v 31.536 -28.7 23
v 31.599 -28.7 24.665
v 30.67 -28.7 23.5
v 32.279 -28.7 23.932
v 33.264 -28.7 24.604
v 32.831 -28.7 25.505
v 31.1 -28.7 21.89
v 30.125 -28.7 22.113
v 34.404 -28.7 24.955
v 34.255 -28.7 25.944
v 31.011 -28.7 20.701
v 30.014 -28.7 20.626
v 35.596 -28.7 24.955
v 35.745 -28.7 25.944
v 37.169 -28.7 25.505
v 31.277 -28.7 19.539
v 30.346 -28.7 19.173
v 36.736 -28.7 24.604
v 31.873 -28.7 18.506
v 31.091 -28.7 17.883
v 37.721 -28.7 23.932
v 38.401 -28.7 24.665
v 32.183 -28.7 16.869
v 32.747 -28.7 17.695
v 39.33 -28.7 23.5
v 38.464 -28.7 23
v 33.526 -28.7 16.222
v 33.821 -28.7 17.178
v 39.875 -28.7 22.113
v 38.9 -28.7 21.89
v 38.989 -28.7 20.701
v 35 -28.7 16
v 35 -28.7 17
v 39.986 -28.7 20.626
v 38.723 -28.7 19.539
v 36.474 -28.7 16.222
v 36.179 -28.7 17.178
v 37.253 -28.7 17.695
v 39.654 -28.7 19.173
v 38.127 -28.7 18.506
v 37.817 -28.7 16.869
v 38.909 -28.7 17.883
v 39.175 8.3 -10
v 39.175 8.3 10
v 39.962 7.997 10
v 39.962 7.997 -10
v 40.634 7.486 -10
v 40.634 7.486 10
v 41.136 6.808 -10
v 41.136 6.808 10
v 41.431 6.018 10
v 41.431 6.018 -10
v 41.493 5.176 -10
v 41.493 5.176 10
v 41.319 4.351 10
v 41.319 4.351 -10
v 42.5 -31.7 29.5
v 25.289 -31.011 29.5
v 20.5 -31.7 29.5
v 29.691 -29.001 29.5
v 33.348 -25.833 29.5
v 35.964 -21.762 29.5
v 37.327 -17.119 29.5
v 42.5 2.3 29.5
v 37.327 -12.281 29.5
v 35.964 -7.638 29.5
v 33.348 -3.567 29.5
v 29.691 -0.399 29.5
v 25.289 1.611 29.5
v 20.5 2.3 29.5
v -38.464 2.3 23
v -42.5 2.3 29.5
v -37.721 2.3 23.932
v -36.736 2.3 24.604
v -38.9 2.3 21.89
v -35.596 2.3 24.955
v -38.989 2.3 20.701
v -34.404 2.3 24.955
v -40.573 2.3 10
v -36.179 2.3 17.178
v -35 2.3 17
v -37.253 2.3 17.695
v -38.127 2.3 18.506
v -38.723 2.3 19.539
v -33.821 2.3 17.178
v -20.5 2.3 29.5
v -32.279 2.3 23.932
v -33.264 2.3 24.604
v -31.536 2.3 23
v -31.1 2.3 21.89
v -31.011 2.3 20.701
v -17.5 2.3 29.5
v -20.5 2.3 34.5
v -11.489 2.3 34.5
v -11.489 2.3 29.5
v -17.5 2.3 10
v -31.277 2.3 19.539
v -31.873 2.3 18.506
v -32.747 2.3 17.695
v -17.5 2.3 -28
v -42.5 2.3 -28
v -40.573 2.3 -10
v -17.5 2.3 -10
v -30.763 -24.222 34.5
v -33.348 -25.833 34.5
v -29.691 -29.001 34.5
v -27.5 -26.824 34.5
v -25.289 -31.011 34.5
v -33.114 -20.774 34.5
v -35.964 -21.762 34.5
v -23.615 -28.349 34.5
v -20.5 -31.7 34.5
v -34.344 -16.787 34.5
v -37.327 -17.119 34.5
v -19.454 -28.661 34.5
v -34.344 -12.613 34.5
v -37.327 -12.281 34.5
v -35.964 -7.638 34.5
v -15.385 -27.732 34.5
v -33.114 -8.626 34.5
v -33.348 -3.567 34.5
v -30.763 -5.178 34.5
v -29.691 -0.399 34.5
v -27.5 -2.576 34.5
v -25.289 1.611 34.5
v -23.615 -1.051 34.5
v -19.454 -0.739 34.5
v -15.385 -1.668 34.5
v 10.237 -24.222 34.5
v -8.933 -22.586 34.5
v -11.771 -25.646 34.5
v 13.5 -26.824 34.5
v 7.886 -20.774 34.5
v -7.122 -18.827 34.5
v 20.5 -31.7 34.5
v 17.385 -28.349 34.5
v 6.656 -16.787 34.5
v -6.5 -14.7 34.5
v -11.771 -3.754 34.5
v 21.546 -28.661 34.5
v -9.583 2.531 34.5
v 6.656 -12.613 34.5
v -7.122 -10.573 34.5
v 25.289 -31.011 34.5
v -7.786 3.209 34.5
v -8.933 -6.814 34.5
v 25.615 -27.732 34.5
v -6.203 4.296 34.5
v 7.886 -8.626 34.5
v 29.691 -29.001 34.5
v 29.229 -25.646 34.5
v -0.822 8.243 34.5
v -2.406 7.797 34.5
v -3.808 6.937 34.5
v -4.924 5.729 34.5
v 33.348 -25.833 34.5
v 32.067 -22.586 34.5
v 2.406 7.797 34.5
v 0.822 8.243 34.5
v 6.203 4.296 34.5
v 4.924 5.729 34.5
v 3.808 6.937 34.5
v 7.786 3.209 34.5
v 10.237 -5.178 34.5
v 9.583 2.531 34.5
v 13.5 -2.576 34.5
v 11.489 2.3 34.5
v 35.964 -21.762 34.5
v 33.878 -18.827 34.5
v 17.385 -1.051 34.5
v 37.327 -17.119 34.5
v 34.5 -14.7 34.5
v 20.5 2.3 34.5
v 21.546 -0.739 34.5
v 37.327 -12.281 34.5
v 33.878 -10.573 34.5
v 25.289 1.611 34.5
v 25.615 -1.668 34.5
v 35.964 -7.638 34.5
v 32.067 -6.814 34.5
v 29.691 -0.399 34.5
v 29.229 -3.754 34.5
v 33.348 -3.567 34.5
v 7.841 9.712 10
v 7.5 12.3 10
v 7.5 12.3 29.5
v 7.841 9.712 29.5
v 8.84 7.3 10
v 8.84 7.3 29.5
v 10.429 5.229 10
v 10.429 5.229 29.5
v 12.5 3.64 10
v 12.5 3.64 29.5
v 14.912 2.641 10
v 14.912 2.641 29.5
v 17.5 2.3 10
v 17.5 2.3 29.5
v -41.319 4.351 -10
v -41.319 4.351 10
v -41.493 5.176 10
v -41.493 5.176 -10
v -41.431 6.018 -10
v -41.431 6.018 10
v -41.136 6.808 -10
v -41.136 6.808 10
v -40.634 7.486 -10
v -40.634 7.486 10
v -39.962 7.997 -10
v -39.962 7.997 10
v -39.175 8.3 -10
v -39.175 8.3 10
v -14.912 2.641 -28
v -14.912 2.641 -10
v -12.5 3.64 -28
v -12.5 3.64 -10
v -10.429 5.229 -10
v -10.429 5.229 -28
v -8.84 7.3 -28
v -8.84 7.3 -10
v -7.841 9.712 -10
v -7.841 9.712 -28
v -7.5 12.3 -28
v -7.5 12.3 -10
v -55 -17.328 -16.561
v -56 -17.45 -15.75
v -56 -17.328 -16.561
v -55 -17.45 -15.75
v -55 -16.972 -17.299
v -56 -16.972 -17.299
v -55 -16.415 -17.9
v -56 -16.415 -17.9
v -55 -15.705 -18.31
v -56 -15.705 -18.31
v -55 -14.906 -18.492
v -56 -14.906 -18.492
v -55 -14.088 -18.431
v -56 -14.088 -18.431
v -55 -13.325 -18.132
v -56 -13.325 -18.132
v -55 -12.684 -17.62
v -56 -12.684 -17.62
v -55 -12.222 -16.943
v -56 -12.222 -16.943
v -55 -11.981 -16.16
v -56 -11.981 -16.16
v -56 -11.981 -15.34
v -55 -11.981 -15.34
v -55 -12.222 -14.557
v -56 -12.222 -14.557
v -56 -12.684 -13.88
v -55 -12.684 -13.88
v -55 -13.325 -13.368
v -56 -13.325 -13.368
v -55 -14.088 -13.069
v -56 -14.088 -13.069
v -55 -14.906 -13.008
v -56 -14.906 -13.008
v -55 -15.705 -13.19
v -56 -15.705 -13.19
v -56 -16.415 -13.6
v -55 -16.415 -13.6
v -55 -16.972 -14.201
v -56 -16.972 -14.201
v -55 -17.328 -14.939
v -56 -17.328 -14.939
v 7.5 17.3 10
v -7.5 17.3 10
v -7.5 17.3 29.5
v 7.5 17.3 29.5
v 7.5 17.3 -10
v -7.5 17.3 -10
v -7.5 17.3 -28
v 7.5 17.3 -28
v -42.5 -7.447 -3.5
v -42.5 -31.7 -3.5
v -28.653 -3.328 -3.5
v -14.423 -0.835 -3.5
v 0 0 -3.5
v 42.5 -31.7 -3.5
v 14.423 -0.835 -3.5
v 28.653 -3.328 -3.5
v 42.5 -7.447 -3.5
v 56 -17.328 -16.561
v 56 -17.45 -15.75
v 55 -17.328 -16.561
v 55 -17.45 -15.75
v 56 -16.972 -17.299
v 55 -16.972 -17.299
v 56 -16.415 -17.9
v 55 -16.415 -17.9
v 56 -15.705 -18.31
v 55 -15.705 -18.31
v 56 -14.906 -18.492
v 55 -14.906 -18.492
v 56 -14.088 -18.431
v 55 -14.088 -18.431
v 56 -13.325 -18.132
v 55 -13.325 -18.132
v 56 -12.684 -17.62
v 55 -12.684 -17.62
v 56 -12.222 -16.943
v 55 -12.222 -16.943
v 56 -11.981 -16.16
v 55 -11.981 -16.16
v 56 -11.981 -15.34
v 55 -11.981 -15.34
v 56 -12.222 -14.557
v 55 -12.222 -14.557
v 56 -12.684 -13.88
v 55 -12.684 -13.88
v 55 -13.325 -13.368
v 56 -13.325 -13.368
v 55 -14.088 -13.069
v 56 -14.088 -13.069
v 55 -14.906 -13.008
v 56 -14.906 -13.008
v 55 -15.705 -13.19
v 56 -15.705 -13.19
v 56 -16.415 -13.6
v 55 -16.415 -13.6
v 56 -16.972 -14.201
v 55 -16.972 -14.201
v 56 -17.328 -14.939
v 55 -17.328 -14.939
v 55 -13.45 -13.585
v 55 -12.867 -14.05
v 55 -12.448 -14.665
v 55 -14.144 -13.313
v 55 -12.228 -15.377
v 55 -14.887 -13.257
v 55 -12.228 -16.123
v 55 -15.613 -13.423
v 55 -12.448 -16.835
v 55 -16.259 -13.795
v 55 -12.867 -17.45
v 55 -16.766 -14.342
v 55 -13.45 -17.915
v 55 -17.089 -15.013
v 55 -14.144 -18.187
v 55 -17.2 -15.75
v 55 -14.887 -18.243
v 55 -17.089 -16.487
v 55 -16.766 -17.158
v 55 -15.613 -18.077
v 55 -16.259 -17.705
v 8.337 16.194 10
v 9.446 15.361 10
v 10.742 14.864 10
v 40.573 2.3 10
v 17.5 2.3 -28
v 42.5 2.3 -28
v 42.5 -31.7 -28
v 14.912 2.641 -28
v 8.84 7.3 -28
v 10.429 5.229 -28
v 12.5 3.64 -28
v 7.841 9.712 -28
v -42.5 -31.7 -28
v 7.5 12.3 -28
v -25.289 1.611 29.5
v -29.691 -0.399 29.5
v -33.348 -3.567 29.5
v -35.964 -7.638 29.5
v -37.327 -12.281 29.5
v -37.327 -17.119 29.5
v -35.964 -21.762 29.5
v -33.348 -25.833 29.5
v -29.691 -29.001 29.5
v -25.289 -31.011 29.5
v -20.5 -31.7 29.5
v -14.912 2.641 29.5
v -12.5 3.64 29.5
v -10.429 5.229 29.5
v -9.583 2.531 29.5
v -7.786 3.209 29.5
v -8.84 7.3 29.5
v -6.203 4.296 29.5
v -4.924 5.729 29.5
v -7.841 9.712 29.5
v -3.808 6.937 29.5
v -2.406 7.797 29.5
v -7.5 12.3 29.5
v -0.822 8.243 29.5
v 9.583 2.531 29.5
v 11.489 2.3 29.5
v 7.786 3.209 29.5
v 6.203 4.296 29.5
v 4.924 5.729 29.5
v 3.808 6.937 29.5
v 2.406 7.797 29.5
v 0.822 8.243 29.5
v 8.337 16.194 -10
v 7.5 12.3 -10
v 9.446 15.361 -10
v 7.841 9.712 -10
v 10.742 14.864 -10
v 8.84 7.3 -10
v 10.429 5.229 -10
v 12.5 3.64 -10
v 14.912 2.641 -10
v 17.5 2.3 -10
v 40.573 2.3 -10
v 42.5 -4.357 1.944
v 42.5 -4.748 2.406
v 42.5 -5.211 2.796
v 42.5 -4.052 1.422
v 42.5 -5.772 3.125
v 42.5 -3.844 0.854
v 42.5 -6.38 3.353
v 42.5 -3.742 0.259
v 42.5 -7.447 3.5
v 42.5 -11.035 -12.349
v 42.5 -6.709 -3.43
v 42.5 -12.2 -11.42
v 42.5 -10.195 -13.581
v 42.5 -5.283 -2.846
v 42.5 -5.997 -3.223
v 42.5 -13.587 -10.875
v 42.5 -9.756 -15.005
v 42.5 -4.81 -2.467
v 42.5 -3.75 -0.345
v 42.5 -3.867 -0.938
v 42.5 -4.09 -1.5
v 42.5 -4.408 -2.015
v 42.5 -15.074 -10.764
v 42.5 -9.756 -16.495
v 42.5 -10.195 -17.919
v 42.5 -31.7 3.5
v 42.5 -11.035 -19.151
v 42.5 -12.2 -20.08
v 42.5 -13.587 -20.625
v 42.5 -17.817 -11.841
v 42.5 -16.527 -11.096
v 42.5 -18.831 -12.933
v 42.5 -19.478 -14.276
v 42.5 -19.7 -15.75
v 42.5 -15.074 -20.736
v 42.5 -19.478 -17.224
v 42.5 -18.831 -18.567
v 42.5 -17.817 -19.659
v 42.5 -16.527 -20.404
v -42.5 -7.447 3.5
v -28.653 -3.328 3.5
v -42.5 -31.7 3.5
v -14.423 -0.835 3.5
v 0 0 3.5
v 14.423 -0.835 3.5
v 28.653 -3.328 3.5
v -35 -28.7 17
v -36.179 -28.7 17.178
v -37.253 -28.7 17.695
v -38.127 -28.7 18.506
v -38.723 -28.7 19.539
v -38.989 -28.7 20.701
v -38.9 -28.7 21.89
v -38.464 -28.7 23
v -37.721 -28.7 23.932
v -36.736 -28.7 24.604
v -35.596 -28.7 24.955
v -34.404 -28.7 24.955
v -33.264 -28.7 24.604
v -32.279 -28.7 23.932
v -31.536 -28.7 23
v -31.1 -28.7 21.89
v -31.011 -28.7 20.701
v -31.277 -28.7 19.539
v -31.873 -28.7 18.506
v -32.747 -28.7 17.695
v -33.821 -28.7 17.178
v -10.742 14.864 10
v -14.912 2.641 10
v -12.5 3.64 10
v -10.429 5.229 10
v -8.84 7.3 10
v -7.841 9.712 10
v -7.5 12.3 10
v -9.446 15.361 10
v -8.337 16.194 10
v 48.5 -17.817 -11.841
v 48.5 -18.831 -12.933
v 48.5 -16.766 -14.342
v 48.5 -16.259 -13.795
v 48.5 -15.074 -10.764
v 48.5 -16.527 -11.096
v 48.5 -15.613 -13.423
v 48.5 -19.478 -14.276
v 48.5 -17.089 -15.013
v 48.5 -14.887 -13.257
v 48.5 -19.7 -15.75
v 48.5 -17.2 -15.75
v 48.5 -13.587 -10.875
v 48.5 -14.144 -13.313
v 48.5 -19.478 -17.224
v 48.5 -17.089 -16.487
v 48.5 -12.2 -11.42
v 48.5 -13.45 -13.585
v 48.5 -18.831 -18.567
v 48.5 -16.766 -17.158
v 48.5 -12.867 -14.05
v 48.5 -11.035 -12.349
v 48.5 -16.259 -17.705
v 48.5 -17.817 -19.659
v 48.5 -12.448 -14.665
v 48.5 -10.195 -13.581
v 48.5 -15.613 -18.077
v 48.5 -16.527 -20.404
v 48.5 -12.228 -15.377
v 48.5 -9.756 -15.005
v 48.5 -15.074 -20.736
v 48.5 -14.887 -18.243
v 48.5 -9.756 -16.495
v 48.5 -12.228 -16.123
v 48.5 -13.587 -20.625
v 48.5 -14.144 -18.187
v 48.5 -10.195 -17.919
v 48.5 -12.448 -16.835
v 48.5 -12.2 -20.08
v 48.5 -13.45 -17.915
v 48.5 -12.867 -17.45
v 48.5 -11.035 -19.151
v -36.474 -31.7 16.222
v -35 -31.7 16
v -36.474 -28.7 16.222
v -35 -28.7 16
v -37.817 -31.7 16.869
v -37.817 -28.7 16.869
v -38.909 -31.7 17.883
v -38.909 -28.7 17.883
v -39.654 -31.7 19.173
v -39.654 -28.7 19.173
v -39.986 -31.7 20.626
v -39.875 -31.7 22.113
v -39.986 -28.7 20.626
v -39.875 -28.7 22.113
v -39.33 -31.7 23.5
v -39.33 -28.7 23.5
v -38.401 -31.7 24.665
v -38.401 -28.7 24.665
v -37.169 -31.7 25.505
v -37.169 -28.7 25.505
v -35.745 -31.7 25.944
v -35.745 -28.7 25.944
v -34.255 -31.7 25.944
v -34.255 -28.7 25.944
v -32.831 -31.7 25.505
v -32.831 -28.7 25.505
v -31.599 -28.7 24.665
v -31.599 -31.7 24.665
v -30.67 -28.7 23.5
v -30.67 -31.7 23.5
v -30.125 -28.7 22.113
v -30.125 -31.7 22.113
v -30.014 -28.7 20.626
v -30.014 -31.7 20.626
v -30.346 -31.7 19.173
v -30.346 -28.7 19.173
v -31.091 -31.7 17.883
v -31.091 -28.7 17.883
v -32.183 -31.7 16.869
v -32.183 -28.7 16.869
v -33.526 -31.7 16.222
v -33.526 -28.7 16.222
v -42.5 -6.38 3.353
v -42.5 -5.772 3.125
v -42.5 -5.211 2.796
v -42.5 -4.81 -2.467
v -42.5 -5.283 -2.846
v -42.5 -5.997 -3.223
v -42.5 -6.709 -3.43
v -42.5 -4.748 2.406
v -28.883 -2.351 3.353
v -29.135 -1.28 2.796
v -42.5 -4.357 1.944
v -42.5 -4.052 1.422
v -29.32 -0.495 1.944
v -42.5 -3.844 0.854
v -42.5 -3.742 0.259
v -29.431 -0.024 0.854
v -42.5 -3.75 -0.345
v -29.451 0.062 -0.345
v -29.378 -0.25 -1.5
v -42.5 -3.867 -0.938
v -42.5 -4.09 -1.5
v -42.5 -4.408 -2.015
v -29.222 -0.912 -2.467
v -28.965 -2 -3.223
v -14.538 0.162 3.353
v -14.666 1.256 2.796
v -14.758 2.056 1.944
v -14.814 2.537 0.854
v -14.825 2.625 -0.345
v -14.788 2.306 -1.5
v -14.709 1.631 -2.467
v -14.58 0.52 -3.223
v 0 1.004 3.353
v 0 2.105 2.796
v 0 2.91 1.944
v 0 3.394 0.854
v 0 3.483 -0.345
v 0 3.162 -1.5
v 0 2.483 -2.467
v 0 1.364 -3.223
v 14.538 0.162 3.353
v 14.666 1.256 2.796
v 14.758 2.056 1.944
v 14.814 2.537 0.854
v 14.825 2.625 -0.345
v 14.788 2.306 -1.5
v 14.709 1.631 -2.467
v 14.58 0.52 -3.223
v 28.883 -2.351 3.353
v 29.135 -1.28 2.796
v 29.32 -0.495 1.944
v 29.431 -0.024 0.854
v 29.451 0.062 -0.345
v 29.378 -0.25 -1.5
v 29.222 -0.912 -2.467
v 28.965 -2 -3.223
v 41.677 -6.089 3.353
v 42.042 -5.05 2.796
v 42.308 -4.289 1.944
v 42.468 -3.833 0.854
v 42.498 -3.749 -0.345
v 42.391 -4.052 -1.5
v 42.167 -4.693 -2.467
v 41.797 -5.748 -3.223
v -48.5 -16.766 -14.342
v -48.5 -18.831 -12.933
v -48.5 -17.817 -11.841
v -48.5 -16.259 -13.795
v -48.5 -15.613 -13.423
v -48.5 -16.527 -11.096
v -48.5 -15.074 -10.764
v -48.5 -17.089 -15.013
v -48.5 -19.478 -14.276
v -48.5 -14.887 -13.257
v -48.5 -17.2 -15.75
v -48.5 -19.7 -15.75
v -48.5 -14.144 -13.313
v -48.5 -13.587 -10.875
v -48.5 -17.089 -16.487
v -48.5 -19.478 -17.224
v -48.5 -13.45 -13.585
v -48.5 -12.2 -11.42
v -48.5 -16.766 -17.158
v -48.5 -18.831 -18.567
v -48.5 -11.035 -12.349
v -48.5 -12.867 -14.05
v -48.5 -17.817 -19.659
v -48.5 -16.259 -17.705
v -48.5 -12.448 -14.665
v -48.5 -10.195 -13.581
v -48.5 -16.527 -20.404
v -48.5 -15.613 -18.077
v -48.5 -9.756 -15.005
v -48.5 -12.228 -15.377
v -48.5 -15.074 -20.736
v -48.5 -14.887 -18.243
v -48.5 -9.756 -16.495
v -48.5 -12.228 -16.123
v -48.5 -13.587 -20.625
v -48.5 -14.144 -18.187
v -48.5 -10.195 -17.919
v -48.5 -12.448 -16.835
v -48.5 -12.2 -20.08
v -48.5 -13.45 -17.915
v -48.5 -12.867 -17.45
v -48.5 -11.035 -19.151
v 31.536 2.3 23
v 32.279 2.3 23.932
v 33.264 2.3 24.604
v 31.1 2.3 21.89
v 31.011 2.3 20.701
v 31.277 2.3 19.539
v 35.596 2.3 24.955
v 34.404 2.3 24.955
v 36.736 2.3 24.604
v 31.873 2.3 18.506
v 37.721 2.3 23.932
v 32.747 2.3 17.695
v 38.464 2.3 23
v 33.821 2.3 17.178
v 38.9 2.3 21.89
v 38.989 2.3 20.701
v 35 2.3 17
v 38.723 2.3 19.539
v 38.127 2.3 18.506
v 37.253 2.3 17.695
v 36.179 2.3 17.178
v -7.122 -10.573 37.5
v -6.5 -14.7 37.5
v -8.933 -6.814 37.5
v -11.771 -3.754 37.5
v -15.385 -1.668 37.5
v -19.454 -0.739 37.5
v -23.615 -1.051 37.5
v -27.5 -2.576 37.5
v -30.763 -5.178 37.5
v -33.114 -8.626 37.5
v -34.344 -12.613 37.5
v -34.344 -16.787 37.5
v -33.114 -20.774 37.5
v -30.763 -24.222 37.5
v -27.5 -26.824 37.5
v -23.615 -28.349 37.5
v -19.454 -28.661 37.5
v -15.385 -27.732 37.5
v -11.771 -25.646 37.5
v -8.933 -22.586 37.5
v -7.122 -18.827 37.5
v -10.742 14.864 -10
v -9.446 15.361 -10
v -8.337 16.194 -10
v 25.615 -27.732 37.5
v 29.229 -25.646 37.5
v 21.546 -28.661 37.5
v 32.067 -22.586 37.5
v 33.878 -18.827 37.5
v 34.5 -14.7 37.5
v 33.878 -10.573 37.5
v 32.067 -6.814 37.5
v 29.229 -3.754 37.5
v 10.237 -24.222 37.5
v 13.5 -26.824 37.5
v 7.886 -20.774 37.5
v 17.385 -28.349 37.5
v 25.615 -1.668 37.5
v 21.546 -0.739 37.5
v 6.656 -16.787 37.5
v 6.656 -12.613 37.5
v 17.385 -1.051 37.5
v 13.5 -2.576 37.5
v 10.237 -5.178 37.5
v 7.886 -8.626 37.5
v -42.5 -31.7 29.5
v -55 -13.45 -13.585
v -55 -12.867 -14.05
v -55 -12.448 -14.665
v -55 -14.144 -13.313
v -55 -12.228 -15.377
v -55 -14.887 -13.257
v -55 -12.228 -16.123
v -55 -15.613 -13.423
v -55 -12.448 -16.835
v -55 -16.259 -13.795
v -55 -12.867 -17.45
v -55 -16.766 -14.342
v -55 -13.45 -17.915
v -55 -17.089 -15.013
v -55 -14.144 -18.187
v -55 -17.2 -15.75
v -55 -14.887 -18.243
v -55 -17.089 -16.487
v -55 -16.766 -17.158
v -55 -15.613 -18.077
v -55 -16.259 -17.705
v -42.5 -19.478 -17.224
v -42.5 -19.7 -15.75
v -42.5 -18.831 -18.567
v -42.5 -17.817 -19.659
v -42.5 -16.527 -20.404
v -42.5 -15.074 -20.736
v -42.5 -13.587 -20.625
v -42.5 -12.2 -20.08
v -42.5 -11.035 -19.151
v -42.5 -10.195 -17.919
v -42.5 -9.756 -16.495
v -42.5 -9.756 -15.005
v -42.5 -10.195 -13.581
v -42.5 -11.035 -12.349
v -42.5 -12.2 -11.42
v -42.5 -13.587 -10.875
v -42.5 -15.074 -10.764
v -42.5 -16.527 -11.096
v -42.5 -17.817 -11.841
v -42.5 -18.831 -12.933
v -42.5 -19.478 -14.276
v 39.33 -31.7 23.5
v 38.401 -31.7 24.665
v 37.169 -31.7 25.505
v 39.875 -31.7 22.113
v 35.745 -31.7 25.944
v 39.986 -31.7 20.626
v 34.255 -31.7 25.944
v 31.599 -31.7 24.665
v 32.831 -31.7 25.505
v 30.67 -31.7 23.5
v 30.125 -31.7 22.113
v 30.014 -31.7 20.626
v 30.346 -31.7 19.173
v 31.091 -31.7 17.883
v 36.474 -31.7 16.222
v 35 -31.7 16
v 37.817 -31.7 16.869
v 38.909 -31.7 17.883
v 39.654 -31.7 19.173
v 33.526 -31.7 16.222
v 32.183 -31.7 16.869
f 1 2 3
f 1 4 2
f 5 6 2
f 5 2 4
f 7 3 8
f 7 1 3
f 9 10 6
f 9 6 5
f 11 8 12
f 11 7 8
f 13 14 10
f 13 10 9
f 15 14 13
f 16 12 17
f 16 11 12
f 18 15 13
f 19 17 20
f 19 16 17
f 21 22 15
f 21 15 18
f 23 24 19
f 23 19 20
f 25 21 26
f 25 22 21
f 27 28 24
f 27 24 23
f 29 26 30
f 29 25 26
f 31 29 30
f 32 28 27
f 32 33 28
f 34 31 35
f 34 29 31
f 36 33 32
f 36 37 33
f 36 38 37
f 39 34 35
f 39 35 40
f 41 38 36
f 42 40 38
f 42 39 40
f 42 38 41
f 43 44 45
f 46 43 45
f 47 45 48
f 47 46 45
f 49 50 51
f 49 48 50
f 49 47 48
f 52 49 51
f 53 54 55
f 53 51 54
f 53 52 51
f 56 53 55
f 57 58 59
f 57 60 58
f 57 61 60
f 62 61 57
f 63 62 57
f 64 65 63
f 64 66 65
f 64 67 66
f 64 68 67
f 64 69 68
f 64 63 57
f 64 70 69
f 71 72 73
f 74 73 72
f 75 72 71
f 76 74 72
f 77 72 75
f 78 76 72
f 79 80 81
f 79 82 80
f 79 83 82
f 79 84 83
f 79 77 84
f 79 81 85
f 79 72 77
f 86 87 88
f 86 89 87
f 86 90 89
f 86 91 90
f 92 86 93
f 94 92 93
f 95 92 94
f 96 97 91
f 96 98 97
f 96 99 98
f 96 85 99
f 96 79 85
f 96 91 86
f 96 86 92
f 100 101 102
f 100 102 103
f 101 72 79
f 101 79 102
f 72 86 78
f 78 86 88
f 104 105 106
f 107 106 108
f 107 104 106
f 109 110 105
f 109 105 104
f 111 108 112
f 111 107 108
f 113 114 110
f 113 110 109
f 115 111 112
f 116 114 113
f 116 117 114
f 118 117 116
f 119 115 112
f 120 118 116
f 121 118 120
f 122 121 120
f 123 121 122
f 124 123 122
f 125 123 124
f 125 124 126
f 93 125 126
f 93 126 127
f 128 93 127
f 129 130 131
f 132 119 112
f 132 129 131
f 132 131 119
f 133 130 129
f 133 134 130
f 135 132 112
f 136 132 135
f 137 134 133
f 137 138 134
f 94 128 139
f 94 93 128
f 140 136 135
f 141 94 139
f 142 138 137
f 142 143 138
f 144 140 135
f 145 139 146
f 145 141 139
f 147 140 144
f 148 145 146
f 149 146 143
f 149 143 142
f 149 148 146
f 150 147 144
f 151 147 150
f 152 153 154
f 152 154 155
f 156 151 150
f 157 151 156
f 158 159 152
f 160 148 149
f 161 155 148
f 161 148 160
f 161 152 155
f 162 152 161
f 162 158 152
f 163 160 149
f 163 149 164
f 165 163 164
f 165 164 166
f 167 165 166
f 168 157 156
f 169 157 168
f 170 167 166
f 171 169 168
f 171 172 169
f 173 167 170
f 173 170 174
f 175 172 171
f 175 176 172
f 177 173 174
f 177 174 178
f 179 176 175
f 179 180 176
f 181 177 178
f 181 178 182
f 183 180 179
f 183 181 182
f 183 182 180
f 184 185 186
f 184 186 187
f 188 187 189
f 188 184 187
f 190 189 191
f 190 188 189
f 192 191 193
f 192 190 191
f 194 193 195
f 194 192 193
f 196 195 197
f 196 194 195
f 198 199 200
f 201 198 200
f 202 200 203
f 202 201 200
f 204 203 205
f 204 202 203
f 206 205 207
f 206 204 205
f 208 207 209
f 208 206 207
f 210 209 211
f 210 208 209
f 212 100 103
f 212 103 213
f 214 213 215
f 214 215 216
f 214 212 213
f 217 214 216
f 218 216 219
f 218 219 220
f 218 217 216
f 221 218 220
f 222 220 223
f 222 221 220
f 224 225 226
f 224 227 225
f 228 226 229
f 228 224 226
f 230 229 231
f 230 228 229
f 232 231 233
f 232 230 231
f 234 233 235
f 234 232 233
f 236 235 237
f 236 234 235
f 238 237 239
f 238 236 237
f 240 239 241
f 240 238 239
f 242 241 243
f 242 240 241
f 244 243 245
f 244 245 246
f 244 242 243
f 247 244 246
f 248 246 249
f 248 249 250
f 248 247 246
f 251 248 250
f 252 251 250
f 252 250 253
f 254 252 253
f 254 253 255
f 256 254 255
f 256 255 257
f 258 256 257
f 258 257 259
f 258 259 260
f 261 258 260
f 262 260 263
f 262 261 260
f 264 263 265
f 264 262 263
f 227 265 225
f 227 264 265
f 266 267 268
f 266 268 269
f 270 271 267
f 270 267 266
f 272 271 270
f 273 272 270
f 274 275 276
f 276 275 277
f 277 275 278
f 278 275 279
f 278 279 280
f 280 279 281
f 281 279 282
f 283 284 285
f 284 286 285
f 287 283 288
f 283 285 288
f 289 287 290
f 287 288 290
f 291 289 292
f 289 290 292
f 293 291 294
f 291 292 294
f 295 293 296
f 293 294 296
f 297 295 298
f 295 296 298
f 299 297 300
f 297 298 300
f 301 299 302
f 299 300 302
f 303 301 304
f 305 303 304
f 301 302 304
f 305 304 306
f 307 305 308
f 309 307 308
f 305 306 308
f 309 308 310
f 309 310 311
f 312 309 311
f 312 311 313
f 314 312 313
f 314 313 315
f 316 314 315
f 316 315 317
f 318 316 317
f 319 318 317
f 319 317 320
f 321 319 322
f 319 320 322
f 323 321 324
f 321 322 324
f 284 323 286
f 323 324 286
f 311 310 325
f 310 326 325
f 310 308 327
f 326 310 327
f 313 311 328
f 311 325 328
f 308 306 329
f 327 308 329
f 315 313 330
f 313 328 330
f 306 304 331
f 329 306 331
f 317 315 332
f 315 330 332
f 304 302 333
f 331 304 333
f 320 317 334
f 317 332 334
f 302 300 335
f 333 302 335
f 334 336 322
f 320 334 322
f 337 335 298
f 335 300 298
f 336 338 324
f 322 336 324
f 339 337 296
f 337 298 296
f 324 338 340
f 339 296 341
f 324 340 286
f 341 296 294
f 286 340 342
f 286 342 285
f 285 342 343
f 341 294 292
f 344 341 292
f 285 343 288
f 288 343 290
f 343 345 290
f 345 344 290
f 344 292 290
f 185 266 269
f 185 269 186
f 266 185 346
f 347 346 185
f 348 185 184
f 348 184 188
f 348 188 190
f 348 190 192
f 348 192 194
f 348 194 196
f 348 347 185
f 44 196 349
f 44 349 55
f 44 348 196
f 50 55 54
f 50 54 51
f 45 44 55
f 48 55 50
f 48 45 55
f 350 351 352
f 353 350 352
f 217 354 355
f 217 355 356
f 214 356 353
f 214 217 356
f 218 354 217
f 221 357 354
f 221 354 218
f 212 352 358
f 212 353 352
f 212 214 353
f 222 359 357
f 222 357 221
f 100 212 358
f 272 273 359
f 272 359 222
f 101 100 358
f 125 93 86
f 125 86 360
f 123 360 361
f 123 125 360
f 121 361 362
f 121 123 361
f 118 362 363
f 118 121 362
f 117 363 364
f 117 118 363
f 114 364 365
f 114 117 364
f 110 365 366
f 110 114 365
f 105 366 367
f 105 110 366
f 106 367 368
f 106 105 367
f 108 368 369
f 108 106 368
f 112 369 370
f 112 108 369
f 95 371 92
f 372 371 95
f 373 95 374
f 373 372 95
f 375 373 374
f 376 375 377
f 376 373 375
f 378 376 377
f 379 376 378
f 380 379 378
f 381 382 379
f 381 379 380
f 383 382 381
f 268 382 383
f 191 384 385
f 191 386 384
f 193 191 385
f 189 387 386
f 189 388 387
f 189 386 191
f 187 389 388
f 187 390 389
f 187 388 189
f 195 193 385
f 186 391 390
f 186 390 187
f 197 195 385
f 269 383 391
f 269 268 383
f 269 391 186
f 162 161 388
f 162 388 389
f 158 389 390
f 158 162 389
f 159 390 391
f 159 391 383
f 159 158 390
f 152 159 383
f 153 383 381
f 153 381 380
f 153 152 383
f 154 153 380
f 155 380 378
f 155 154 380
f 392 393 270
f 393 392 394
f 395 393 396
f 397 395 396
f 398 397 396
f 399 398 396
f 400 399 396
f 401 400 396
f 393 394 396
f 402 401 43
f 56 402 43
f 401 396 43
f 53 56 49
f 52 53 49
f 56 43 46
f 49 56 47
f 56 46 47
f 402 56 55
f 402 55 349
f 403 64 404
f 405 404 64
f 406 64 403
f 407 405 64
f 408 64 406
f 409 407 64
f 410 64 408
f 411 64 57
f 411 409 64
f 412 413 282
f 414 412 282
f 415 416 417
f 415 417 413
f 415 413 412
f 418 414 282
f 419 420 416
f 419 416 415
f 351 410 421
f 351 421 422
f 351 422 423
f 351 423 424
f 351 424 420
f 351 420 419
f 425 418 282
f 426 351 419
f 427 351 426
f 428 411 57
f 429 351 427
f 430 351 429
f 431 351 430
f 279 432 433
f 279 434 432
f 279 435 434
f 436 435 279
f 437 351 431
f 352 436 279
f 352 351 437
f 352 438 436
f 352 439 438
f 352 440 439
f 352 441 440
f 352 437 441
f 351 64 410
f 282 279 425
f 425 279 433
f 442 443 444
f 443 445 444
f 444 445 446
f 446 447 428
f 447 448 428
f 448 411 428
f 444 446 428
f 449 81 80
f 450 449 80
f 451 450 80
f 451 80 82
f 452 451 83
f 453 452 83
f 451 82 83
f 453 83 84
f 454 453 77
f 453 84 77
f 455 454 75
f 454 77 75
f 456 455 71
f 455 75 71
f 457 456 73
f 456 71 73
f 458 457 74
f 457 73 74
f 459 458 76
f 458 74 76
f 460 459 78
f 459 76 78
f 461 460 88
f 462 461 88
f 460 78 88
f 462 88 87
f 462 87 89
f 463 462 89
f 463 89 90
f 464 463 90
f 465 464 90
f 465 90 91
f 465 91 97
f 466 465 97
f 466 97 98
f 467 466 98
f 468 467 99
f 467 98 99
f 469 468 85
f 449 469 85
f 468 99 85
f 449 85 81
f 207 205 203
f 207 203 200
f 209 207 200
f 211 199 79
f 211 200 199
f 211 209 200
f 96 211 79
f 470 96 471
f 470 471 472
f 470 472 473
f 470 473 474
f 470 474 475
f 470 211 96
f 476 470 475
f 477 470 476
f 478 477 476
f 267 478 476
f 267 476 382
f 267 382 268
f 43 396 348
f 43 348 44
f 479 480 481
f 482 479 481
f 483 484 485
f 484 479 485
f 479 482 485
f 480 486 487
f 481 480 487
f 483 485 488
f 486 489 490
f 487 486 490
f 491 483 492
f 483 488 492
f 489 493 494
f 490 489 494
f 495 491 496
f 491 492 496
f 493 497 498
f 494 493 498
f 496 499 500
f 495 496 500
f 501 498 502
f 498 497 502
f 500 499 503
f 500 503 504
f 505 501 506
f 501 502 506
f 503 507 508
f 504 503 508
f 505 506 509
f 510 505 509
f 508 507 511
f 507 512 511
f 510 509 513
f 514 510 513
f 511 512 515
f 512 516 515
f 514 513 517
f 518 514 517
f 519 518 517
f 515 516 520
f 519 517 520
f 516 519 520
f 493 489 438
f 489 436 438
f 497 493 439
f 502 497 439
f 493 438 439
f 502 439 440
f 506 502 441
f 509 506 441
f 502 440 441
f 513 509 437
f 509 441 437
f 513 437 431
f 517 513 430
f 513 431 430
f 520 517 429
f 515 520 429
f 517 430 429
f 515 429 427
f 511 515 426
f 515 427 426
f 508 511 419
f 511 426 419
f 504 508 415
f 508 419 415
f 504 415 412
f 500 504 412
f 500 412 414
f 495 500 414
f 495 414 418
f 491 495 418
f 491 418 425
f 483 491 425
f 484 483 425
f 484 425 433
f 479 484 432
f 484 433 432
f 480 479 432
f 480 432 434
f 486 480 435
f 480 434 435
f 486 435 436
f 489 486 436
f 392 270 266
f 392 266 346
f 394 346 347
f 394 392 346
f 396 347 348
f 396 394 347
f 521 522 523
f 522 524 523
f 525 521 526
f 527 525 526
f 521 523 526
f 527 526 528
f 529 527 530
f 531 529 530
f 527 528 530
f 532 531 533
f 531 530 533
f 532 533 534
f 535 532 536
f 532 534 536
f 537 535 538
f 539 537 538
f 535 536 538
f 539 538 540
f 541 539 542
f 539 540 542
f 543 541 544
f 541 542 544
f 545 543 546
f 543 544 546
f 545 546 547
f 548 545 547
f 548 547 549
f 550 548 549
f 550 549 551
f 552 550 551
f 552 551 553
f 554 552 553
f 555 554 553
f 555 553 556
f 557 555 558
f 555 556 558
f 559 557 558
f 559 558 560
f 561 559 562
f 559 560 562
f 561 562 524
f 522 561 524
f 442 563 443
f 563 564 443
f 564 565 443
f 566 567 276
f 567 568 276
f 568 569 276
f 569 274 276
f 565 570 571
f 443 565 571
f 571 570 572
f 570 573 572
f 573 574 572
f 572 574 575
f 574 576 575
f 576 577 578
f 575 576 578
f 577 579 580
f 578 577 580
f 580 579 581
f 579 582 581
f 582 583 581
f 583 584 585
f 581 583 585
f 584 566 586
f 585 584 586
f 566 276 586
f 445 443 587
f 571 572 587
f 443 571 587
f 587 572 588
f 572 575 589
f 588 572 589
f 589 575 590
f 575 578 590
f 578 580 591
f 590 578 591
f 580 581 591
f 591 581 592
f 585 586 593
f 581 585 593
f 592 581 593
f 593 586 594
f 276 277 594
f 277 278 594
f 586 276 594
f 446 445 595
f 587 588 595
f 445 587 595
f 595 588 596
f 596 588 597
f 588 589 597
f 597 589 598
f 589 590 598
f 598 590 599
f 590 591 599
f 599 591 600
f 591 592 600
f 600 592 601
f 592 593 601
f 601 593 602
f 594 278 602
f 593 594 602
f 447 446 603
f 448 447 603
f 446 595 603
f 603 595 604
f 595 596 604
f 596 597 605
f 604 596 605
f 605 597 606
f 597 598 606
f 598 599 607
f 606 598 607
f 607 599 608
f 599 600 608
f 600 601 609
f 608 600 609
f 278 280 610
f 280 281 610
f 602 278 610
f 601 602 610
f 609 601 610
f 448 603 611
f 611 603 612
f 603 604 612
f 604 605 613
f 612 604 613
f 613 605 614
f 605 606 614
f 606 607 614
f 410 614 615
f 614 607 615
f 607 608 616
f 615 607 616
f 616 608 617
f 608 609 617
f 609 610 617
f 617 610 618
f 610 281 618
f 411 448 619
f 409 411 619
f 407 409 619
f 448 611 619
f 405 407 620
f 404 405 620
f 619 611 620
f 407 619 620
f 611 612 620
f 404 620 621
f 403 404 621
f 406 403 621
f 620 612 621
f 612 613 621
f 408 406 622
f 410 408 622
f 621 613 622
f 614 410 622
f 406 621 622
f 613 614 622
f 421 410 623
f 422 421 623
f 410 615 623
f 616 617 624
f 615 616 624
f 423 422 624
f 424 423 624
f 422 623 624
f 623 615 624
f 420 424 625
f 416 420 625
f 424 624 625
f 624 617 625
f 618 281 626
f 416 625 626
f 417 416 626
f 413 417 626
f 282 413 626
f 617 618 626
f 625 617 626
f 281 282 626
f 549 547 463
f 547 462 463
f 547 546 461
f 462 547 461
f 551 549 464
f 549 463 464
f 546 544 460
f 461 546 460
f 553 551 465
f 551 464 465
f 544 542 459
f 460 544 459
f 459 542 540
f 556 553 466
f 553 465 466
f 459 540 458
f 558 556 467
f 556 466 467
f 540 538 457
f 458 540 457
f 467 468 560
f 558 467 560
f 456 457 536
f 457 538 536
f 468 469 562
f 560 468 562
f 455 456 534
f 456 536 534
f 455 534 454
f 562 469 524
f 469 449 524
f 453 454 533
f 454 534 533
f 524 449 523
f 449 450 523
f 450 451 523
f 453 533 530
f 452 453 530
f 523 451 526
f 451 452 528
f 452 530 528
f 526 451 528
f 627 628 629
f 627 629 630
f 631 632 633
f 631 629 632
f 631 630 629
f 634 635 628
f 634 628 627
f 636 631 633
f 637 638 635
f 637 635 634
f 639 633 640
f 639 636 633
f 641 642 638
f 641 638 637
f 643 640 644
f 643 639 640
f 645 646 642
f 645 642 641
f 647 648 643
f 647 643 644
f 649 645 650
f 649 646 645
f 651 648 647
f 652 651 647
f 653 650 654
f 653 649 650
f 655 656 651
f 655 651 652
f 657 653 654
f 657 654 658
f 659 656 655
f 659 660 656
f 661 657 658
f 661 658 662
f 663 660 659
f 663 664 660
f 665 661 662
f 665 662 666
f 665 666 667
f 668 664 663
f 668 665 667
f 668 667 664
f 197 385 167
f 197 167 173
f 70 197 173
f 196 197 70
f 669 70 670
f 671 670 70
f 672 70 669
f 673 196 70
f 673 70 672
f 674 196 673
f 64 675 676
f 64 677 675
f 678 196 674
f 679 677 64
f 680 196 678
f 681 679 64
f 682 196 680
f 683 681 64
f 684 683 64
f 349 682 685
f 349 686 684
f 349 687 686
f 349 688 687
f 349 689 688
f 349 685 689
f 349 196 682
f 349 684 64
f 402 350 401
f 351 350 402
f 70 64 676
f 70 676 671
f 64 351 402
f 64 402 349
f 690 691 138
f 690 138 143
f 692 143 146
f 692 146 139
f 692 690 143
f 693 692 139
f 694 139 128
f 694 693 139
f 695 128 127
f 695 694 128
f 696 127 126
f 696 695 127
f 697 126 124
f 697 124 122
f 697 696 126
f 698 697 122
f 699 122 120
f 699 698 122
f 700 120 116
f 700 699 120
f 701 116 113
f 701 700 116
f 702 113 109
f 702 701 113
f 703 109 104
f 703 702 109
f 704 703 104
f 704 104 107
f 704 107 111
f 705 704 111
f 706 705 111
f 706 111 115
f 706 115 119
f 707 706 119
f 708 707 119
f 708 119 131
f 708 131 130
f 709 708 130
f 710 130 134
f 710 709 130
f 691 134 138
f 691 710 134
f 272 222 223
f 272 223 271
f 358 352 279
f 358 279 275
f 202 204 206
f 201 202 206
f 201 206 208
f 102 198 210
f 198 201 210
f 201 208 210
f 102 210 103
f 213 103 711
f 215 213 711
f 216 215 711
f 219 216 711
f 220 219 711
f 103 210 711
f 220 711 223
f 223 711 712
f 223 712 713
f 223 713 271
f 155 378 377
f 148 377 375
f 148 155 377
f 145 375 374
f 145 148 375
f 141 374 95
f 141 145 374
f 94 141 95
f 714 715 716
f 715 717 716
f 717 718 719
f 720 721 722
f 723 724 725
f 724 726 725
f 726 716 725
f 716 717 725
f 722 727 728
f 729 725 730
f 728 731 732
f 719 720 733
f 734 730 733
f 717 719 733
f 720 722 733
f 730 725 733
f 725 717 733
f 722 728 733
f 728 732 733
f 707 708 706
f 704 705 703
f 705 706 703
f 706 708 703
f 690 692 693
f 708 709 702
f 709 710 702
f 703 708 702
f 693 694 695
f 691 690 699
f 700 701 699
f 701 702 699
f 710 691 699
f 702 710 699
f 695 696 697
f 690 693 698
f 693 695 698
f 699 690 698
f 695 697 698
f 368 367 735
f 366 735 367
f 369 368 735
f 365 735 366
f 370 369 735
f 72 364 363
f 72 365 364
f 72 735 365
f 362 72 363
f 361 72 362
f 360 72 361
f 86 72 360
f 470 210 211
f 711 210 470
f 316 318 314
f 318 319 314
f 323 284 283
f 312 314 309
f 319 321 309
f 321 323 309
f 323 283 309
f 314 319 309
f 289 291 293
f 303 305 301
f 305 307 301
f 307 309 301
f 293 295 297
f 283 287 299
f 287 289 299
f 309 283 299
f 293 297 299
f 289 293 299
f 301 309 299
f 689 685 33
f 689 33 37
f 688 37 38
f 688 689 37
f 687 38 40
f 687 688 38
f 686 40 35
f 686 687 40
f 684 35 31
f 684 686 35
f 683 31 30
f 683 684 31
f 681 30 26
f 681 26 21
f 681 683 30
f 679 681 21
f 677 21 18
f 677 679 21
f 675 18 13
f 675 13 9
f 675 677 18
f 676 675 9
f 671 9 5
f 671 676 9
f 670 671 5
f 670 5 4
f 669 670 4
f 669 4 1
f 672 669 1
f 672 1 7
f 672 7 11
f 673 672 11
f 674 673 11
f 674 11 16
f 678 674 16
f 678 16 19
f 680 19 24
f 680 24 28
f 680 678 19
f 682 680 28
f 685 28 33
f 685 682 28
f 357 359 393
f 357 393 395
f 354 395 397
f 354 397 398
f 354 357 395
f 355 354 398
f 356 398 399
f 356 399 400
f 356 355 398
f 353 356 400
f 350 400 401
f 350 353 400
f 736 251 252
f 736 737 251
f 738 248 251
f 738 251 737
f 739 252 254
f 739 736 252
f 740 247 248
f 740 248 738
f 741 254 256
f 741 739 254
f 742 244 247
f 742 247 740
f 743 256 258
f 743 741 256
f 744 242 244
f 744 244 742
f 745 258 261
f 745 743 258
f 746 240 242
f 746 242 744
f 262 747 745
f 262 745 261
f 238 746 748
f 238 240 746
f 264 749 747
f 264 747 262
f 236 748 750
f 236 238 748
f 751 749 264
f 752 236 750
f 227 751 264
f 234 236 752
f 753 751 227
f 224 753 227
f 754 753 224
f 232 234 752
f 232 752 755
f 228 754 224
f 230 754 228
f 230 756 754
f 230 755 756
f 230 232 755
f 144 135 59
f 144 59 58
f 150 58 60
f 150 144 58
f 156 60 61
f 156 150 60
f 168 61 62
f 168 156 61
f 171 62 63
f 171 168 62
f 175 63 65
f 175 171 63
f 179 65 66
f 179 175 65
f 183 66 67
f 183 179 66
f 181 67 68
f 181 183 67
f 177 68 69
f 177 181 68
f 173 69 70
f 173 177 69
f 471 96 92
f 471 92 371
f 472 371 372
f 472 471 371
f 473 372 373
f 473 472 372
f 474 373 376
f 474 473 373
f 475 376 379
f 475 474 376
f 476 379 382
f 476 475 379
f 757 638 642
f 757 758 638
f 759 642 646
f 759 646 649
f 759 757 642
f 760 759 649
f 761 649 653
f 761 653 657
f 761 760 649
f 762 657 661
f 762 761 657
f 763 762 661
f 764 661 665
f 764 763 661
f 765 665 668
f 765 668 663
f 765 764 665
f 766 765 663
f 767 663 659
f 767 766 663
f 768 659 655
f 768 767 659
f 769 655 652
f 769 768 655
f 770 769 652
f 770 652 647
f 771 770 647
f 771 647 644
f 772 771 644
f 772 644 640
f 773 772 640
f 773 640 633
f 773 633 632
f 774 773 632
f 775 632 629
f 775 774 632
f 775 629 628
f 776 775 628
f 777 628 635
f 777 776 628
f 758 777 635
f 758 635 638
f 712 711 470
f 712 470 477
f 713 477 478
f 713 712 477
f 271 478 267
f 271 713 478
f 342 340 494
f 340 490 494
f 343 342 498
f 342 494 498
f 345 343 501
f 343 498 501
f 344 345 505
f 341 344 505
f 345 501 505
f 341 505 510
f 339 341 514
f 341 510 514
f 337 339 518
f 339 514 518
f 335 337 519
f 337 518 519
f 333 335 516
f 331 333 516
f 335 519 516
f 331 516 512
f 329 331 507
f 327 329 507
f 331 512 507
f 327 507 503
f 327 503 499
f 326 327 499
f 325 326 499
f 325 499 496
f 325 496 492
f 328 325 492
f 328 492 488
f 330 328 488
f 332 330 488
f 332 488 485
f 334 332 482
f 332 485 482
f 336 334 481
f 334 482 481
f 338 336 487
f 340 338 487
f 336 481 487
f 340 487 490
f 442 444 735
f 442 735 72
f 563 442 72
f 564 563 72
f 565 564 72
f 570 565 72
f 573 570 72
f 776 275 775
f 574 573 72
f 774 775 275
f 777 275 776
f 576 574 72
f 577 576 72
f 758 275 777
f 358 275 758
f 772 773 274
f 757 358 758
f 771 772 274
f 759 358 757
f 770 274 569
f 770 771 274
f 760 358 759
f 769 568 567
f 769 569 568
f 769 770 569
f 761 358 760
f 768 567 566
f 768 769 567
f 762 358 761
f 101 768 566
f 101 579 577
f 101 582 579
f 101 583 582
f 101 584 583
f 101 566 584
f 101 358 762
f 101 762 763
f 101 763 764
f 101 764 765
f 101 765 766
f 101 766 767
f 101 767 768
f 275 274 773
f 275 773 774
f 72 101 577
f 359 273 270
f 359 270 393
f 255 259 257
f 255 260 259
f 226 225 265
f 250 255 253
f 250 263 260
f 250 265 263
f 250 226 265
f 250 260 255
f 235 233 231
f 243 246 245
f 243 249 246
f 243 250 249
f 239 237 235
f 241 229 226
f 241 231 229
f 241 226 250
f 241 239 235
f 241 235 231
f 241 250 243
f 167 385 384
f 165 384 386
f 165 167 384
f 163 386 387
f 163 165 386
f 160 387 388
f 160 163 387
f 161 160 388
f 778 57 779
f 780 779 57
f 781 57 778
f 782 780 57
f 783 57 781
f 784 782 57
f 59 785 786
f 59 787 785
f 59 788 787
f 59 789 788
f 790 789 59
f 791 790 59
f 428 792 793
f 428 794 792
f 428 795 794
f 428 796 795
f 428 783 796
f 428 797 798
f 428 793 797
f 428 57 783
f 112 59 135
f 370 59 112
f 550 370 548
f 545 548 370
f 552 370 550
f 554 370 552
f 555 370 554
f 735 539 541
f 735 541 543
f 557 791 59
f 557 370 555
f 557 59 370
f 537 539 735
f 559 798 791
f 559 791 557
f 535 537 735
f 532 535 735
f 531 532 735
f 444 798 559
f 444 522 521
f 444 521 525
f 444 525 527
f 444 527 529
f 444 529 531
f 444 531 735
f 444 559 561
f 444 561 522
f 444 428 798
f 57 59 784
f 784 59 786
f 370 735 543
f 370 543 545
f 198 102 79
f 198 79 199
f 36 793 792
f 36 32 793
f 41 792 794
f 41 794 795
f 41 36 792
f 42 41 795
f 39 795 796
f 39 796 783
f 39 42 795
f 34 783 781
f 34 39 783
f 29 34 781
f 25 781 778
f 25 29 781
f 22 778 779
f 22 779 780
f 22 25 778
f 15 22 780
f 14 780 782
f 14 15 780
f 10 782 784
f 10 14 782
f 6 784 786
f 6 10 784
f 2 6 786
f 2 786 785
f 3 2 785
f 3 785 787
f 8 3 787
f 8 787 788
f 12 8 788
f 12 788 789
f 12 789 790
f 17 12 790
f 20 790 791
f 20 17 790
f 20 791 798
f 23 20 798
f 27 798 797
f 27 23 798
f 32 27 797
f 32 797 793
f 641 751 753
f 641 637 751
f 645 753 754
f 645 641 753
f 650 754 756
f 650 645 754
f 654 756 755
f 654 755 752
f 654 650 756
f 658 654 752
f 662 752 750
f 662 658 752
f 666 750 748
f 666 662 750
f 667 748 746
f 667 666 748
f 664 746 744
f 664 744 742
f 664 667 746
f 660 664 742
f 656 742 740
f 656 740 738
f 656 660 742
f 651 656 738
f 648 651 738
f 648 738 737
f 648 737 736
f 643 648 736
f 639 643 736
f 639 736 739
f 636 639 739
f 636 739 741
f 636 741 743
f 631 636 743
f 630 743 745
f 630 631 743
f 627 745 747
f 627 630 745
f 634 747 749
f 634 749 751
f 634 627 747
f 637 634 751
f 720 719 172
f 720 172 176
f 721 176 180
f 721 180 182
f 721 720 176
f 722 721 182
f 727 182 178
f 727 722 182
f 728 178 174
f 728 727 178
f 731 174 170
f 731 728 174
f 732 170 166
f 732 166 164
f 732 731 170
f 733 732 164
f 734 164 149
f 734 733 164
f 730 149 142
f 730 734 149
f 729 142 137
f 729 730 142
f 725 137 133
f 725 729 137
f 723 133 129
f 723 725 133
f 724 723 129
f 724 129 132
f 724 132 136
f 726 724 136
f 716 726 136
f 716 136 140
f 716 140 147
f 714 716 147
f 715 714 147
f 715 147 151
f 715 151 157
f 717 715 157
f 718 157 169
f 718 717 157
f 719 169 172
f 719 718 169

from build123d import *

# Parameters (mm, degrees)
BOSS_EXTRUDE1_DEPTH      = 37.5
BOSS_EXTRUDE1_DEPTH_BACK = 28
CUT_EXTRUDE2_START       = -28
CUT_EXTRUDE2_DEPTH       = 18
CUT_EXTRUDE3_START       = 10
CUT_EXTRUDE3_DEPTH       = 27.5
SKETCH6_OUTSIDE_W        = 110.594
SKETCH6_OUTSIDE_H        = 74.594
CUT_EXTRUDE4_DEPTH       = 8
SKETCH7_OUTSIDE_W        = 110.594
SKETCH7_OUTSIDE_H        = 74.594
SKETCH7_OUTSIDE_R        = 14
CUT_EXTRUDE5_DEPTH       = 3


# Read off the part's stored shape, not the designer's step: Cut-Extrude2, Cut-Extrude3
with BuildPart() as part:
    # Sketch1 → Boss-Extrude1 (new, two sides: drawn at the far end of the back side and taken through both)
    with BuildSketch(Plane.XY.offset(-BOSS_EXTRUDE1_DEPTH_BACK)):
        with BuildLine():
            Line((-42.5, 2.3), (-40.572637014, 2.3))
            Line((-40.572637014, 2.3), (-41.319077862, 4.350829376))
            ThreePointArc((-41.319077862, 4.350829376), (-41.136451338, 6.808366086), (-39.174853163, 8.3))
            Line((-39.174853163, 8.3), (-10.741593286, 14.864335276))
            ThreePointArc((-10.741593286, 14.864335276), (-8.862822134, 15.738832848), (-7.5, 17.3))
            Line((-7.5, 17.3), (7.5, 17.3))
            ThreePointArc((7.5, 17.3), (8.862822134, 15.738832848), (10.741593286, 14.864335276))
            Line((10.741593286, 14.864335276), (39.174853163, 8.3))
            ThreePointArc((39.174853163, 8.3), (41.136451338, 6.808366086), (41.319077862, 4.350829376))
            Line((41.319077862, 4.350829376), (40.572637014, 2.3))
            Line((40.572637014, 2.3), (42.5, 2.3))
            Line((42.5, 2.3), (42.5, -31.7))
            Line((42.5, -31.7), (-42.5, -31.7))
            Line((-42.5, -31.7), (-42.5, 2.3))
        make_face()
    extrude(amount=BOSS_EXTRUDE1_DEPTH + BOSS_EXTRUDE1_DEPTH_BACK)

    # Sketch2 → Cut-Revolve1 (revolve, cut)
    with BuildSketch(Plane(origin=(0, 0, 0), x_dir=(0, 0, -1), z_dir=(1, 0, 0))):
        with BuildLine():
            Line((-3.5, -125), (-3.5, 0))
            ThreePointArc((-3.5, 0), (0, 3.5), (3.5, 0))
            Line((3.5, 0), (3.5, -125))
            Line((3.5, -125), (-3.5, -125))
        make_face()
    revolve(axis=Axis((0, -125, 37.5), (0, 0, -1)), mode=Mode.SUBTRACT)

    # Cut-Extrude2 outline → Cut-Extrude2 (cut)
    with BuildSketch(Plane.XY.offset(CUT_EXTRUDE2_START)):
        with BuildLine():
            ThreePointArc((7.5, 12.3), (10.428932188, 5.228932188), (17.5, 2.3))
            Line((17.5, 2.3), (40.572637014, 2.3))
            Line((40.572637014, 2.3), (41.319077862, 4.350829376))
            ThreePointArc((41.319077862, 4.350829376), (41.136451338, 6.808366087), (39.174853163, 8.3))
            Line((39.174853163, 8.3), (10.741593286, 14.864335276))
            ThreePointArc((10.741593286, 14.864335276), (8.862822134, 15.738832848), (7.5, 17.3))
            Line((7.5, 17.3), (7.5, 12.3))
        make_face()
        with BuildLine():
            Line((-41.319077862, 4.350829376), (-40.572637014, 2.3))
            Line((-40.572637014, 2.3), (-17.5, 2.3))
            ThreePointArc((-17.5, 2.3), (-10.428932188, 5.228932188), (-7.5, 12.3))
            Line((-7.5, 12.3), (-7.5, 17.3))
            ThreePointArc((-7.5, 17.3), (-8.862822134, 15.738832848), (-10.741593286, 14.864335276))
            Line((-10.741593286, 14.864335276), (-39.174853163, 8.3))
            ThreePointArc((-39.174853163, 8.3), (-41.136451338, 6.808366087), (-41.319077862, 4.350829376))
        make_face()
    extrude(amount=CUT_EXTRUDE2_DEPTH, mode=Mode.SUBTRACT)

    # Cut-Extrude3 outline → Cut-Extrude3 (cut)
    with BuildSketch(Plane.XY.offset(CUT_EXTRUDE3_START)):
        with BuildLine():
            ThreePointArc((7.5, 12.3), (10.428932188, 5.228932188), (17.5, 2.3))
            Line((17.5, 2.3), (40.572637014, 2.3))
            Line((40.572637014, 2.3), (41.319077862, 4.350829376))
            ThreePointArc((41.319077862, 4.350829376), (41.136451338, 6.808366087), (39.174853163, 8.3))
            Line((39.174853163, 8.3), (10.741593286, 14.864335276))
            ThreePointArc((10.741593286, 14.864335276), (8.862822134, 15.738832848), (7.5, 17.3))
            Line((7.5, 17.3), (7.5, 12.3))
        make_face()
        with BuildLine():
            Line((-41.319077862, 4.350829376), (-40.572637014, 2.3))
            Line((-40.572637014, 2.3), (-17.5, 2.3))
            ThreePointArc((-17.5, 2.3), (-10.428932188, 5.228932188), (-7.5, 12.3))
            Line((-7.5, 12.3), (-7.5, 17.3))
            ThreePointArc((-7.5, 17.3), (-8.862822134, 15.738832848), (-10.741593286, 14.864335276))
            Line((-10.741593286, 14.864335276), (-39.174853163, 8.3))
            ThreePointArc((-39.174853163, 8.3), (-41.136451338, 6.808366087), (-41.319077862, 4.350829376))
        make_face()
    extrude(amount=CUT_EXTRUDE3_DEPTH, mode=Mode.SUBTRACT)

    # Sketch5 → Cut-Revolve2 (revolve, cut)
    with BuildSketch(Plane.XY.offset(21), mode=Mode.PRIVATE) as cut_revolve2_sk:
        Polygon((-35, -31.7), (-40, -31.7), (-40, -28.7), (-39, -28.7), (-39, 17.3), (-35, 17.3), align=None)
    cut_revolve2 = revolve(cut_revolve2_sk.sketch.rotate(Axis((-35, -31.7, 21), (0, 1, 0)), 270), axis=Axis((-35, -31.7, 21), (0, 1, 0)), mode=Mode.SUBTRACT)

    # Mirror1: Cut-Revolve2 across plane
    add(cut_revolve2.mirror(Plane(origin=(0, 0, 0), x_dir=(0, 0, 1), z_dir=(1, 0, 0))), mode=Mode.SUBTRACT)

    # Sketch6 outside → Cut-Extrude4 (cut)
    with BuildSketch(Plane.XY.offset(37.5)):
        with Locations((0, -7.2)):
            Rectangle(SKETCH6_OUTSIDE_W, SKETCH6_OUTSIDE_H)
        with BuildLine():
            Line((20.5, 2.3), (11.489125293, 2.3))
            ThreePointArc((11.489125293, 2.3), (7.785844894, 3.208757917), (4.92391084, 5.728571429))
            ThreePointArc((4.92391084, 5.728571429), (0, 8.3), (-4.92391084, 5.728571429))
            ThreePointArc((-4.92391084, 5.728571429), (-7.785844894, 3.208757917), (-11.489125293, 2.3))
            Line((-11.489125293, 2.3), (-20.5, 2.3))
            ThreePointArc((-20.5, 2.3), (-37.5, -14.7), (-20.5, -31.7))
            Line((-20.5, -31.7), (20.5, -31.7))
            ThreePointArc((20.5, -31.7), (37.5, -14.7), (20.5, 2.3))
        make_face(mode=Mode.SUBTRACT)
    extrude(amount=-CUT_EXTRUDE4_DEPTH, mode=Mode.SUBTRACT)

    # Sketch7 outside → Cut-Extrude5 (cut)
    with BuildSketch(Plane.XY.offset(37.5)):
        with Locations((0, -7.2)):
            Rectangle(SKETCH7_OUTSIDE_W, SKETCH7_OUTSIDE_H)
        with Locations((-20.5, -14.7)):
            Circle(SKETCH7_OUTSIDE_R, mode=Mode.SUBTRACT)
        with Locations((20.5, -14.7)):
            Circle(SKETCH7_OUTSIDE_R, mode=Mode.SUBTRACT)
    extrude(amount=-CUT_EXTRUDE5_DEPTH, mode=Mode.SUBTRACT)

    # Sketch8 → Revolve1 (revolve)
    with BuildSketch(Plane.XY.offset(-15.75)):
        Polygon((-56, -14.7), (-56, -17.45), (-55, -17.45), (-55, -17.2), (-48.5, -17.2), (-48.5, -19.7), (-42.5, -19.7), (-42.5, -14.7), align=None)
        Polygon((42.5, -19.7), (42.5, -14.7), (56, -14.7), (56, -17.45), (55, -17.45), (55, -17.2), (48.5, -17.2), (48.5, -19.7), align=None)
    revolve(axis=Axis((-56, -14.7, -15.75), (1, 0, 0)))


solid = part.part
